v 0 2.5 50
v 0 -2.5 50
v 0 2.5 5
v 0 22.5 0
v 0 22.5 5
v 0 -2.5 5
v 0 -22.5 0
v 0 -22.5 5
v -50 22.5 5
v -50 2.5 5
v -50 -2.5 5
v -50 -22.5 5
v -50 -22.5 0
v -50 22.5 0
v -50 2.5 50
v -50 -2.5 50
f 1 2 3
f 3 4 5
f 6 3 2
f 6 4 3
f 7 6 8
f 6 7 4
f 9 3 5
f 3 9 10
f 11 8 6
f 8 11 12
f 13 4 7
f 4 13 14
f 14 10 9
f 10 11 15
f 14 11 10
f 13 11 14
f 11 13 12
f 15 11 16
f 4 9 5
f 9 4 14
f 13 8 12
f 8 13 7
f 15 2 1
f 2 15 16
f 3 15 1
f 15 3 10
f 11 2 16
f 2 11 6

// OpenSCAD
// Built by bench/smallmodels/features/compiler.py from a list of features.
$fn = 64;
difference() {
  union() {
    translate([-25, 0, 0]) translate([-25, -22.5, 0]) cube([50, 45, 5]);
    translate([-25, 0, 0]) translate([-25, -2.5, 0]) cube([50, 5, 50]);
  }
  union() {
    translate([-17, 30, 3.75]) rotate([0, 0, 0]) rotate([0, 90, 0]) cylinder(d = 4.5, h = 1200, center = true);
    translate([17, 30, 3.75]) rotate([0, 0, 0]) rotate([0, 90, 0]) cylinder(d = 4.5, h = 1200, center = true);
  }
}
difference() {
  union() {
    translate([-25, 0, 0]) translate([-25, -2.5, 0]) cube([50, 5, 50]);
  }
  union() {
    translate([0, 28, 45.24]) rotate([0, 0, 0]) cylinder(d = 23, h = 4.77);
    translate([-15.5, 28, 48.49]) rotate([0, 0, 0]) cylinder(d = 3.4, h = 1.52);
    translate([-15.5, 28, 48.49]) rotate([0, 0, 90]) cylinder(d = 3.4, h = 1.52);
    translate([-15.5, 28, 48.49]) rotate([0, 0, 180]) cylinder(d = 3.4, h = 1.52);
    translate([-15.5, 28, 48.49]) rotate([0, 0, 270]) cylinder(d = 3.4, h = 1.52);
    translate([15.5, 28, 48.49]) rotate([0, 0, 0]) cylinder(d = 3.4, h = 1.52);
    translate([15.5, 28, 48.49]) rotate([0, 0, 90]) cylinder(d = 3.4, h = 1.52);
    translate([15.5, 28, 48.49]) rotate([0, 0, 180]) cylinder(d = 3.4, h = 1.52);
    translate([15.5, 28, 48.49]) rotate([0, 0, 270]) cylinder(d = 3.4, h = 1.52);
  }
}
